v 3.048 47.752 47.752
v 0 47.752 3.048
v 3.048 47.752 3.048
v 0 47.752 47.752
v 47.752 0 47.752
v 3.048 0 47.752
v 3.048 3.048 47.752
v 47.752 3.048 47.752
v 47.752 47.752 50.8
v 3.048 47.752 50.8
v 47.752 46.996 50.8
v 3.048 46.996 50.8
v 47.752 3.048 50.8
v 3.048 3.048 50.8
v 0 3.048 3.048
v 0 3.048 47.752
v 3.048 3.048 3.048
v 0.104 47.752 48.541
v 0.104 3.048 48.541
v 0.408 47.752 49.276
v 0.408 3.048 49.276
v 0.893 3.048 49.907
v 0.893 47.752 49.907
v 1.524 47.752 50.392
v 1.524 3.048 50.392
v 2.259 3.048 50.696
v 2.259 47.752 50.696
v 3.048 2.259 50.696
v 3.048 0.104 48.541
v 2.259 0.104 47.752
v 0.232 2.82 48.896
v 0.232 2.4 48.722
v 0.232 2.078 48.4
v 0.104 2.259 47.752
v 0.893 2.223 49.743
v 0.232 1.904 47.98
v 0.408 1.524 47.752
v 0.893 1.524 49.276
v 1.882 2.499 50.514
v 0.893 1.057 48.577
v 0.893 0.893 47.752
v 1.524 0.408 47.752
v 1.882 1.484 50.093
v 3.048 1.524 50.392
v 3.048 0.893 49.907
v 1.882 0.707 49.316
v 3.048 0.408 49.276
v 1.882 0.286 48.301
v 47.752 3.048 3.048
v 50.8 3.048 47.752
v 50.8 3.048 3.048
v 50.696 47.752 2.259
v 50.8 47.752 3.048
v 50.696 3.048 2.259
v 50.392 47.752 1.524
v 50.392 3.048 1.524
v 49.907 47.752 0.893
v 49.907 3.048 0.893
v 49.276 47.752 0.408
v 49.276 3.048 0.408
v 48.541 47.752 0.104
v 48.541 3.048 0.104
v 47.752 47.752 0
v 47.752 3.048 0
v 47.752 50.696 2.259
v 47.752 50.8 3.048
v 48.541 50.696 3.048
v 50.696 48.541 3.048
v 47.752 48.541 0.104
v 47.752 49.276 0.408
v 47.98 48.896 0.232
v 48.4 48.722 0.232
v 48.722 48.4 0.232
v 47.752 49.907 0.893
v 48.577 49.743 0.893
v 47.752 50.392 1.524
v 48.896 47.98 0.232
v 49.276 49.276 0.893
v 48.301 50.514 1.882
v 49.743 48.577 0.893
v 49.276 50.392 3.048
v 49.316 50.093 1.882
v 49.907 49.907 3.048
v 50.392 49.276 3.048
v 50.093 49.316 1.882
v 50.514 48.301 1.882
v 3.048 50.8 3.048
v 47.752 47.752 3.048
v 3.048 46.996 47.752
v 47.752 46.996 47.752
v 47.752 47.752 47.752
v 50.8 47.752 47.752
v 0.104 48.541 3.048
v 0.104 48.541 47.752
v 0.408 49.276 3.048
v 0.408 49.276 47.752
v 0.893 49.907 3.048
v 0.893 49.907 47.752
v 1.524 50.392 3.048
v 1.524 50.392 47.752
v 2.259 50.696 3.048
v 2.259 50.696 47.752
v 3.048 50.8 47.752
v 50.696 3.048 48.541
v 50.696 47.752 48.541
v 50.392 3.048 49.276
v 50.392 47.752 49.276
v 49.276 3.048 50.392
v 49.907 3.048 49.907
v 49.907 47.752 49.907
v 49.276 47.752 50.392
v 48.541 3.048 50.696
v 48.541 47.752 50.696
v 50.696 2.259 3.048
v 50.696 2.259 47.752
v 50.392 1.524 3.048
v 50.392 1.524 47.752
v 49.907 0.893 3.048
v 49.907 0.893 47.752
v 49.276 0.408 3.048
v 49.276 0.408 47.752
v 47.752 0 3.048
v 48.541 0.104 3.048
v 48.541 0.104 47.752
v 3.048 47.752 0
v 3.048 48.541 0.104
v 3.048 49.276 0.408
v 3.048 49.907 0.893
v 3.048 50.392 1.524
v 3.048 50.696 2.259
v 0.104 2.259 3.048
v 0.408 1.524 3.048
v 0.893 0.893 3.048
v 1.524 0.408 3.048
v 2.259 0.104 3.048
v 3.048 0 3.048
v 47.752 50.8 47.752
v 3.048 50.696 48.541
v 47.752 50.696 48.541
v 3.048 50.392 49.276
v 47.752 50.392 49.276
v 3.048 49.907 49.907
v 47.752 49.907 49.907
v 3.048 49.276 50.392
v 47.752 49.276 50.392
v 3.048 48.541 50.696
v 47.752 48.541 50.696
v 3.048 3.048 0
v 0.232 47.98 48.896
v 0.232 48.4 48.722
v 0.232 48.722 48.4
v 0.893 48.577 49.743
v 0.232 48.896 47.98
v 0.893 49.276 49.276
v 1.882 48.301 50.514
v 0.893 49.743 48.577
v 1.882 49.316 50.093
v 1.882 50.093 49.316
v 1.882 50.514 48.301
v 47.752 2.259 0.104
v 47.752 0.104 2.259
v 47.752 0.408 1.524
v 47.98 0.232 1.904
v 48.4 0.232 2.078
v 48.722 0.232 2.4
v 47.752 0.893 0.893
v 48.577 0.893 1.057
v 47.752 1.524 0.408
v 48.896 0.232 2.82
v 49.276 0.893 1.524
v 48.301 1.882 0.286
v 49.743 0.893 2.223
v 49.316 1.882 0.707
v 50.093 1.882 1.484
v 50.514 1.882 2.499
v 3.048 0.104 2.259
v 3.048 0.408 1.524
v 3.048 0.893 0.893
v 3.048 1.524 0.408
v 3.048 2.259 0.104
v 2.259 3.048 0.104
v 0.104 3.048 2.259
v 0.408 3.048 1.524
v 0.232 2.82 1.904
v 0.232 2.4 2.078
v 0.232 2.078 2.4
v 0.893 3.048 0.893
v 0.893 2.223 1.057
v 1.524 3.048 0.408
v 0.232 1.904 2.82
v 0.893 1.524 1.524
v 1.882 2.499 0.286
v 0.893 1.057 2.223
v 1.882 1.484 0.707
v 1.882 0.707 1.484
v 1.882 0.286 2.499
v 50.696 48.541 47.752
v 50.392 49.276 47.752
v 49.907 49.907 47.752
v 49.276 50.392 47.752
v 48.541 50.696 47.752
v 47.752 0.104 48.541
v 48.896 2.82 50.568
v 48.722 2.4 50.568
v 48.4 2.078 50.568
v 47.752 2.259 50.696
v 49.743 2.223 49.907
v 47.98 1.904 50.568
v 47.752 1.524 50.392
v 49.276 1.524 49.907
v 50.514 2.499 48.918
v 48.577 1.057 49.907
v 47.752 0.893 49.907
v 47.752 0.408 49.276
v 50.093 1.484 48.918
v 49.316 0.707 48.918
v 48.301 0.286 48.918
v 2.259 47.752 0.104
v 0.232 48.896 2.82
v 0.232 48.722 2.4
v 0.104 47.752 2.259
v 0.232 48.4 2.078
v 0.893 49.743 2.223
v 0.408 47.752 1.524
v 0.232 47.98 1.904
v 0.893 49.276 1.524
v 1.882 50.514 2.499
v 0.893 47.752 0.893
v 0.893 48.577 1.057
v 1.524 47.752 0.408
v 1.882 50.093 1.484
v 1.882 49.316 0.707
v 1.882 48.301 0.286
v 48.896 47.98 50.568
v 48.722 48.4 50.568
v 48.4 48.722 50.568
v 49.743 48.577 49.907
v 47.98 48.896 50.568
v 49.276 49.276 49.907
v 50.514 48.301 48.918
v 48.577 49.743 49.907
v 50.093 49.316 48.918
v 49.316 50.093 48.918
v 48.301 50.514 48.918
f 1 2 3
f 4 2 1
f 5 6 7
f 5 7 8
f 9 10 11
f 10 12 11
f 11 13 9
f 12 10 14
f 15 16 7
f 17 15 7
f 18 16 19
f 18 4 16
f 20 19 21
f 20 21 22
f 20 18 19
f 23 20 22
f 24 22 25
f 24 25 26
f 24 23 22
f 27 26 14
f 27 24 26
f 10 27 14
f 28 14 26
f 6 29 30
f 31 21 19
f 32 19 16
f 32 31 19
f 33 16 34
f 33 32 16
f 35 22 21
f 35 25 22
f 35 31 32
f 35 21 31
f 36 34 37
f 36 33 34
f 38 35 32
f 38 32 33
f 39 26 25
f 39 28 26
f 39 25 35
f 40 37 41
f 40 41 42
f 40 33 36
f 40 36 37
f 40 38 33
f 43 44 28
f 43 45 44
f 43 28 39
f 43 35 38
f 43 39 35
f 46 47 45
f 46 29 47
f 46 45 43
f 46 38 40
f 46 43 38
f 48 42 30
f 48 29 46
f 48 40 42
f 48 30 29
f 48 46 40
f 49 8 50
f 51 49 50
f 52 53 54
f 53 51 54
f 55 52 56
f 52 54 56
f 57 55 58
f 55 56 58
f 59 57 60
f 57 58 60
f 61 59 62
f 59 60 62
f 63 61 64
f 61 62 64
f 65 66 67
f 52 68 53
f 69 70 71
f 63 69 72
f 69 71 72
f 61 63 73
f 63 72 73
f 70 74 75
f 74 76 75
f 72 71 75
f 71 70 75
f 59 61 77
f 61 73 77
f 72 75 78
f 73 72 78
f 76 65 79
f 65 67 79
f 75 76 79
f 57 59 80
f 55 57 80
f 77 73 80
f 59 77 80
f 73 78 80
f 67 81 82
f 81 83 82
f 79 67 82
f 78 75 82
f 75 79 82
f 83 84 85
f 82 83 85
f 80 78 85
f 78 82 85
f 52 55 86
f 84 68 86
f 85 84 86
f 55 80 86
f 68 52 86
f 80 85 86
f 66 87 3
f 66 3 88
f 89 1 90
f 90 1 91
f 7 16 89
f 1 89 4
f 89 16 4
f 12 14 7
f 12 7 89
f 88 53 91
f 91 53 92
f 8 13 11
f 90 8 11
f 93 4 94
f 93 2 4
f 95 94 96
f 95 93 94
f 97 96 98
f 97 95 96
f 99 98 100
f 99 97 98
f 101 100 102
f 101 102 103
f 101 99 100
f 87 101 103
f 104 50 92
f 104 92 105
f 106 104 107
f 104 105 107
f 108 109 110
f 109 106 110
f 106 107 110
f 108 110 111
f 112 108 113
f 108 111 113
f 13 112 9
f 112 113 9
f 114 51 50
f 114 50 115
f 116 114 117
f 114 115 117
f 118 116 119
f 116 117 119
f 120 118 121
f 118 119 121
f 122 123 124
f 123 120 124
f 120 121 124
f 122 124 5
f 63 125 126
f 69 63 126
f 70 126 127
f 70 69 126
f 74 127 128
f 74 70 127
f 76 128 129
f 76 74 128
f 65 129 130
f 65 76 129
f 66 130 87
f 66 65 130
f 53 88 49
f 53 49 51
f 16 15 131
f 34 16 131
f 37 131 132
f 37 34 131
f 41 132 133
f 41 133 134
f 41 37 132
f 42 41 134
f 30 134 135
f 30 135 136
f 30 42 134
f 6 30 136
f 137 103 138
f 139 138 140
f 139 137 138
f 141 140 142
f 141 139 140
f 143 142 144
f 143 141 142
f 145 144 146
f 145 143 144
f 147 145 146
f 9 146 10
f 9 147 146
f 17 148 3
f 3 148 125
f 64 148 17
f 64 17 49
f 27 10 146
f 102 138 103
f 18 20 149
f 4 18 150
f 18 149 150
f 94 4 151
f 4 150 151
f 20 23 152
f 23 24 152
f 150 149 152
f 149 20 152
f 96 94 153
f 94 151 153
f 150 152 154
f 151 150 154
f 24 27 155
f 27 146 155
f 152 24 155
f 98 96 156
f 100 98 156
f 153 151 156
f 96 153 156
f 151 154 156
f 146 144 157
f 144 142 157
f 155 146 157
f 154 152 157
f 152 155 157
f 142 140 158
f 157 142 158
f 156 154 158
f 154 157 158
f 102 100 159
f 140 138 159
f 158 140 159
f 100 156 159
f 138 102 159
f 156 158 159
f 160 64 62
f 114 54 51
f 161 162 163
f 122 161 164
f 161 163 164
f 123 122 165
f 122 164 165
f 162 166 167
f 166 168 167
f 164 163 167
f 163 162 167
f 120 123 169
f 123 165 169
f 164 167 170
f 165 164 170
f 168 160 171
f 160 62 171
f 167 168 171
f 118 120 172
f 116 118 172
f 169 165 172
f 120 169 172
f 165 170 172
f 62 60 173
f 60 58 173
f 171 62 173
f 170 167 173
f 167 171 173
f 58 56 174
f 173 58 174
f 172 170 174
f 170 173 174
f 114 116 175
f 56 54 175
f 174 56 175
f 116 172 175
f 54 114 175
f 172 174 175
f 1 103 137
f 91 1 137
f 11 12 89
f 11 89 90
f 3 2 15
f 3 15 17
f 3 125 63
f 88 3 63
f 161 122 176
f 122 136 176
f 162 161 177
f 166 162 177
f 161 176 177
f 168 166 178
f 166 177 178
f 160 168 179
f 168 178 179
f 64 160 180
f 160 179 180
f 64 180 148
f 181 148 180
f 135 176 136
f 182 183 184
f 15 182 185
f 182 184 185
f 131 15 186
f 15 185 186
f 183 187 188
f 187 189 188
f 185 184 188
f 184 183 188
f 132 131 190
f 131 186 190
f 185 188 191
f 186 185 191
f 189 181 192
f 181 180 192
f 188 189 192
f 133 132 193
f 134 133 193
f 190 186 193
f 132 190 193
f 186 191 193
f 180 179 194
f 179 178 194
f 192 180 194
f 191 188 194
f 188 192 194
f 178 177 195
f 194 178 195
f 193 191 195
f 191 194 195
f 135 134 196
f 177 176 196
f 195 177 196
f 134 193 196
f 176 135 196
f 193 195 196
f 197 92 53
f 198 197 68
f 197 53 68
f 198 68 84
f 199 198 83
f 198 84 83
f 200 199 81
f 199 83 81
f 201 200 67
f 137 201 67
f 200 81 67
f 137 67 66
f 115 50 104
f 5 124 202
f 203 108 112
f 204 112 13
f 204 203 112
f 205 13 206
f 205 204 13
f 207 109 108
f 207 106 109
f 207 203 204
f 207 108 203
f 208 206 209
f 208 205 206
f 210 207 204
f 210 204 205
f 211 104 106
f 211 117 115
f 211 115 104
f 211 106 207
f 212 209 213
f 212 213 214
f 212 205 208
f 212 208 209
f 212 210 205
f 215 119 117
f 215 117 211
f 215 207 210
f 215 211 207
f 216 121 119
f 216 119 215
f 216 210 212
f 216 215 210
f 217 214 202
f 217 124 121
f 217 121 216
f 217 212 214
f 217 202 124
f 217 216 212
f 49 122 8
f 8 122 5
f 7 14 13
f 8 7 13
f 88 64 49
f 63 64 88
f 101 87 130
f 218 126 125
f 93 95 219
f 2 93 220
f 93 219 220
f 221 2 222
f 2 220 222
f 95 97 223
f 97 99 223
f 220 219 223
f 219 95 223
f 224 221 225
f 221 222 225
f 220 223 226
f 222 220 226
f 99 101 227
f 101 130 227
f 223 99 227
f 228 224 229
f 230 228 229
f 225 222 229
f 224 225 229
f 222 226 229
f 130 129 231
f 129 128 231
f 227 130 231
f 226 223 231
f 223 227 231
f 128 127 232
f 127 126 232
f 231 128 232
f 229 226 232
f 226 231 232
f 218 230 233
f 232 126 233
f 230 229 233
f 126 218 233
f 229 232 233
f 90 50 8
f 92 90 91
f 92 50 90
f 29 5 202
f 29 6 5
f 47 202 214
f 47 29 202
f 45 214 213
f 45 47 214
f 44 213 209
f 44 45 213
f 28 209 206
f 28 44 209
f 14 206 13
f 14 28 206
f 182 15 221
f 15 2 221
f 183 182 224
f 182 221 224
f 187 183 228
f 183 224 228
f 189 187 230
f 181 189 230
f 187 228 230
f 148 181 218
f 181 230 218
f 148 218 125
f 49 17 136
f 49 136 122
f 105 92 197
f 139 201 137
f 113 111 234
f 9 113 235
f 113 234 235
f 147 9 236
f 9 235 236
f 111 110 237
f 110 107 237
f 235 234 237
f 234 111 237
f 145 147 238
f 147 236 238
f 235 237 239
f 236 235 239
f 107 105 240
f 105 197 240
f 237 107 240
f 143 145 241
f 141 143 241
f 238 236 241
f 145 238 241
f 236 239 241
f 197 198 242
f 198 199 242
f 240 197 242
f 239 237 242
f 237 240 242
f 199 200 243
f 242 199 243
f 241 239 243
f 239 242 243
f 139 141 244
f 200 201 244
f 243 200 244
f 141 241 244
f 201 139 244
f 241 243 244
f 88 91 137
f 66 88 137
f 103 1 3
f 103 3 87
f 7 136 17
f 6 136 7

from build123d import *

# Parameters (mm, degrees)
F0_W      = 50.8
F0_H      = 50.8
F0_W_2    = 44.704000783
F0_H_2    = 44.704000783
F9_DEPTH  = 3.048
F1_W      = 50.8
F1_H      = 50.8
F1_W_2    = 44.704000783
F1_H_2    = 44.704000783
F10_DEPTH = 3.048
F2_W      = 50.8
F2_H      = 50.8
F2_W_2    = 44.704000783
F2_H_2    = 44.704000783
F11_DEPTH = 3.048
F6_W      = 50.8
F6_H      = 50.8
F6_W_2    = 44.704000783
F6_H_2    = 44.704000783
F12_DEPTH = 3.048
F7_W      = 50.8
F7_H      = 50.8
F7_W_2    = 44.704000783
F7_H_2    = 44.704000783
F13_DEPTH = 3.048
F8_W      = 50.8
F8_H      = 50.0440469261
F8_W_2    = 44.7040001482
F8_H_2    = 43.9480470743
F14_DEPTH = 3.048
F15_R     = 3.04799


# Not quite as in the source:
# - a fillet or chamfer is up to 0.001 mm smaller than in the source, because OpenCascade refuses the exact size


with BuildPart() as f9:
    # F0 (on Top) → F9 (new body)
    with BuildSketch(Plane.XY):
        with Locations((25.4, 25.4)):
            Rectangle(F0_W, F0_H)
        with Locations((25.4, 25.4)):
            Rectangle(F0_W_2, F0_H_2, mode=Mode.SUBTRACT)
    extrude(amount=F9_DEPTH)

    # F1 (on Front) → F10 (join)
    with BuildSketch(Plane.XZ):
        with Locations((25.4, 25.4)):
            Rectangle(F1_W, F1_H)
        with Locations((25.4, 25.4)):
            Rectangle(F1_W_2, F1_H_2, mode=Mode.SUBTRACT)
    extrude(amount=-F10_DEPTH)

    # F2 (on Right) → F11 (join)
    with BuildSketch(Plane.YZ):
        with Locations((25.4, 25.4)):
            Rectangle(F2_W, F2_H)
        with Locations((25.4, 25.4)):
            Rectangle(F2_W_2, F2_H_2, mode=Mode.SUBTRACT)
    extrude(amount=F11_DEPTH)

    # F6 (on offset) → F12 (join)
    with BuildSketch(Plane.YZ.offset(50.8)):
        with Locations((25.4, 25.4)):
            Rectangle(F6_W, F6_H)
        with Locations((25.4, 25.4)):
            Rectangle(F6_W_2, F6_H_2, mode=Mode.SUBTRACT)
    extrude(amount=-F12_DEPTH)

    # F7 (on offset) → F13 (join)
    with BuildSketch(Plane.XZ.offset(-50.8)):
        with Locations((25.4, 25.4)):
            Rectangle(F7_W, F7_H)
        with Locations((25.4, 25.4)):
            Rectangle(F7_W_2, F7_H_2, mode=Mode.SUBTRACT)
    extrude(amount=F13_DEPTH)

    # F8 (on offset) → F14 (join)
    with BuildSketch(Plane.XY.offset(50.8)):
        with Locations((25.4, 25.022023463)):
            Rectangle(F8_W, F8_H)
        with Locations((25.4, 25.022023463)):
            Rectangle(F8_W_2, F8_H_2, mode=Mode.SUBTRACT)
    extrude(amount=-F14_DEPTH)

    # F15 (radius 3.048 in the source; OpenCascade refuses exactly that, so slightly less here)
    f15_edges = [f9.edges().sort_by_distance(p)[0] for p in [
        (50.8, 50.8, 25.4),
        (25.4, 50.8, 0),
        (50.8, 25.4, 0),
        (25.4, 0, 0),
        (50.8, 0, 25.4),
        (50.8, 25.4, 50.8),
        (25.4, 50.8, 50.8),
        (25.4, 0, 50.8),
        (0, 25.4, 50.8),
        (0, 50.8, 25.4),
        (0, 25.4, 0),
        (0, 0, 25.4),
    ]]
    fillet(f15_edges, radius=F15_R)


solid = f9.part
